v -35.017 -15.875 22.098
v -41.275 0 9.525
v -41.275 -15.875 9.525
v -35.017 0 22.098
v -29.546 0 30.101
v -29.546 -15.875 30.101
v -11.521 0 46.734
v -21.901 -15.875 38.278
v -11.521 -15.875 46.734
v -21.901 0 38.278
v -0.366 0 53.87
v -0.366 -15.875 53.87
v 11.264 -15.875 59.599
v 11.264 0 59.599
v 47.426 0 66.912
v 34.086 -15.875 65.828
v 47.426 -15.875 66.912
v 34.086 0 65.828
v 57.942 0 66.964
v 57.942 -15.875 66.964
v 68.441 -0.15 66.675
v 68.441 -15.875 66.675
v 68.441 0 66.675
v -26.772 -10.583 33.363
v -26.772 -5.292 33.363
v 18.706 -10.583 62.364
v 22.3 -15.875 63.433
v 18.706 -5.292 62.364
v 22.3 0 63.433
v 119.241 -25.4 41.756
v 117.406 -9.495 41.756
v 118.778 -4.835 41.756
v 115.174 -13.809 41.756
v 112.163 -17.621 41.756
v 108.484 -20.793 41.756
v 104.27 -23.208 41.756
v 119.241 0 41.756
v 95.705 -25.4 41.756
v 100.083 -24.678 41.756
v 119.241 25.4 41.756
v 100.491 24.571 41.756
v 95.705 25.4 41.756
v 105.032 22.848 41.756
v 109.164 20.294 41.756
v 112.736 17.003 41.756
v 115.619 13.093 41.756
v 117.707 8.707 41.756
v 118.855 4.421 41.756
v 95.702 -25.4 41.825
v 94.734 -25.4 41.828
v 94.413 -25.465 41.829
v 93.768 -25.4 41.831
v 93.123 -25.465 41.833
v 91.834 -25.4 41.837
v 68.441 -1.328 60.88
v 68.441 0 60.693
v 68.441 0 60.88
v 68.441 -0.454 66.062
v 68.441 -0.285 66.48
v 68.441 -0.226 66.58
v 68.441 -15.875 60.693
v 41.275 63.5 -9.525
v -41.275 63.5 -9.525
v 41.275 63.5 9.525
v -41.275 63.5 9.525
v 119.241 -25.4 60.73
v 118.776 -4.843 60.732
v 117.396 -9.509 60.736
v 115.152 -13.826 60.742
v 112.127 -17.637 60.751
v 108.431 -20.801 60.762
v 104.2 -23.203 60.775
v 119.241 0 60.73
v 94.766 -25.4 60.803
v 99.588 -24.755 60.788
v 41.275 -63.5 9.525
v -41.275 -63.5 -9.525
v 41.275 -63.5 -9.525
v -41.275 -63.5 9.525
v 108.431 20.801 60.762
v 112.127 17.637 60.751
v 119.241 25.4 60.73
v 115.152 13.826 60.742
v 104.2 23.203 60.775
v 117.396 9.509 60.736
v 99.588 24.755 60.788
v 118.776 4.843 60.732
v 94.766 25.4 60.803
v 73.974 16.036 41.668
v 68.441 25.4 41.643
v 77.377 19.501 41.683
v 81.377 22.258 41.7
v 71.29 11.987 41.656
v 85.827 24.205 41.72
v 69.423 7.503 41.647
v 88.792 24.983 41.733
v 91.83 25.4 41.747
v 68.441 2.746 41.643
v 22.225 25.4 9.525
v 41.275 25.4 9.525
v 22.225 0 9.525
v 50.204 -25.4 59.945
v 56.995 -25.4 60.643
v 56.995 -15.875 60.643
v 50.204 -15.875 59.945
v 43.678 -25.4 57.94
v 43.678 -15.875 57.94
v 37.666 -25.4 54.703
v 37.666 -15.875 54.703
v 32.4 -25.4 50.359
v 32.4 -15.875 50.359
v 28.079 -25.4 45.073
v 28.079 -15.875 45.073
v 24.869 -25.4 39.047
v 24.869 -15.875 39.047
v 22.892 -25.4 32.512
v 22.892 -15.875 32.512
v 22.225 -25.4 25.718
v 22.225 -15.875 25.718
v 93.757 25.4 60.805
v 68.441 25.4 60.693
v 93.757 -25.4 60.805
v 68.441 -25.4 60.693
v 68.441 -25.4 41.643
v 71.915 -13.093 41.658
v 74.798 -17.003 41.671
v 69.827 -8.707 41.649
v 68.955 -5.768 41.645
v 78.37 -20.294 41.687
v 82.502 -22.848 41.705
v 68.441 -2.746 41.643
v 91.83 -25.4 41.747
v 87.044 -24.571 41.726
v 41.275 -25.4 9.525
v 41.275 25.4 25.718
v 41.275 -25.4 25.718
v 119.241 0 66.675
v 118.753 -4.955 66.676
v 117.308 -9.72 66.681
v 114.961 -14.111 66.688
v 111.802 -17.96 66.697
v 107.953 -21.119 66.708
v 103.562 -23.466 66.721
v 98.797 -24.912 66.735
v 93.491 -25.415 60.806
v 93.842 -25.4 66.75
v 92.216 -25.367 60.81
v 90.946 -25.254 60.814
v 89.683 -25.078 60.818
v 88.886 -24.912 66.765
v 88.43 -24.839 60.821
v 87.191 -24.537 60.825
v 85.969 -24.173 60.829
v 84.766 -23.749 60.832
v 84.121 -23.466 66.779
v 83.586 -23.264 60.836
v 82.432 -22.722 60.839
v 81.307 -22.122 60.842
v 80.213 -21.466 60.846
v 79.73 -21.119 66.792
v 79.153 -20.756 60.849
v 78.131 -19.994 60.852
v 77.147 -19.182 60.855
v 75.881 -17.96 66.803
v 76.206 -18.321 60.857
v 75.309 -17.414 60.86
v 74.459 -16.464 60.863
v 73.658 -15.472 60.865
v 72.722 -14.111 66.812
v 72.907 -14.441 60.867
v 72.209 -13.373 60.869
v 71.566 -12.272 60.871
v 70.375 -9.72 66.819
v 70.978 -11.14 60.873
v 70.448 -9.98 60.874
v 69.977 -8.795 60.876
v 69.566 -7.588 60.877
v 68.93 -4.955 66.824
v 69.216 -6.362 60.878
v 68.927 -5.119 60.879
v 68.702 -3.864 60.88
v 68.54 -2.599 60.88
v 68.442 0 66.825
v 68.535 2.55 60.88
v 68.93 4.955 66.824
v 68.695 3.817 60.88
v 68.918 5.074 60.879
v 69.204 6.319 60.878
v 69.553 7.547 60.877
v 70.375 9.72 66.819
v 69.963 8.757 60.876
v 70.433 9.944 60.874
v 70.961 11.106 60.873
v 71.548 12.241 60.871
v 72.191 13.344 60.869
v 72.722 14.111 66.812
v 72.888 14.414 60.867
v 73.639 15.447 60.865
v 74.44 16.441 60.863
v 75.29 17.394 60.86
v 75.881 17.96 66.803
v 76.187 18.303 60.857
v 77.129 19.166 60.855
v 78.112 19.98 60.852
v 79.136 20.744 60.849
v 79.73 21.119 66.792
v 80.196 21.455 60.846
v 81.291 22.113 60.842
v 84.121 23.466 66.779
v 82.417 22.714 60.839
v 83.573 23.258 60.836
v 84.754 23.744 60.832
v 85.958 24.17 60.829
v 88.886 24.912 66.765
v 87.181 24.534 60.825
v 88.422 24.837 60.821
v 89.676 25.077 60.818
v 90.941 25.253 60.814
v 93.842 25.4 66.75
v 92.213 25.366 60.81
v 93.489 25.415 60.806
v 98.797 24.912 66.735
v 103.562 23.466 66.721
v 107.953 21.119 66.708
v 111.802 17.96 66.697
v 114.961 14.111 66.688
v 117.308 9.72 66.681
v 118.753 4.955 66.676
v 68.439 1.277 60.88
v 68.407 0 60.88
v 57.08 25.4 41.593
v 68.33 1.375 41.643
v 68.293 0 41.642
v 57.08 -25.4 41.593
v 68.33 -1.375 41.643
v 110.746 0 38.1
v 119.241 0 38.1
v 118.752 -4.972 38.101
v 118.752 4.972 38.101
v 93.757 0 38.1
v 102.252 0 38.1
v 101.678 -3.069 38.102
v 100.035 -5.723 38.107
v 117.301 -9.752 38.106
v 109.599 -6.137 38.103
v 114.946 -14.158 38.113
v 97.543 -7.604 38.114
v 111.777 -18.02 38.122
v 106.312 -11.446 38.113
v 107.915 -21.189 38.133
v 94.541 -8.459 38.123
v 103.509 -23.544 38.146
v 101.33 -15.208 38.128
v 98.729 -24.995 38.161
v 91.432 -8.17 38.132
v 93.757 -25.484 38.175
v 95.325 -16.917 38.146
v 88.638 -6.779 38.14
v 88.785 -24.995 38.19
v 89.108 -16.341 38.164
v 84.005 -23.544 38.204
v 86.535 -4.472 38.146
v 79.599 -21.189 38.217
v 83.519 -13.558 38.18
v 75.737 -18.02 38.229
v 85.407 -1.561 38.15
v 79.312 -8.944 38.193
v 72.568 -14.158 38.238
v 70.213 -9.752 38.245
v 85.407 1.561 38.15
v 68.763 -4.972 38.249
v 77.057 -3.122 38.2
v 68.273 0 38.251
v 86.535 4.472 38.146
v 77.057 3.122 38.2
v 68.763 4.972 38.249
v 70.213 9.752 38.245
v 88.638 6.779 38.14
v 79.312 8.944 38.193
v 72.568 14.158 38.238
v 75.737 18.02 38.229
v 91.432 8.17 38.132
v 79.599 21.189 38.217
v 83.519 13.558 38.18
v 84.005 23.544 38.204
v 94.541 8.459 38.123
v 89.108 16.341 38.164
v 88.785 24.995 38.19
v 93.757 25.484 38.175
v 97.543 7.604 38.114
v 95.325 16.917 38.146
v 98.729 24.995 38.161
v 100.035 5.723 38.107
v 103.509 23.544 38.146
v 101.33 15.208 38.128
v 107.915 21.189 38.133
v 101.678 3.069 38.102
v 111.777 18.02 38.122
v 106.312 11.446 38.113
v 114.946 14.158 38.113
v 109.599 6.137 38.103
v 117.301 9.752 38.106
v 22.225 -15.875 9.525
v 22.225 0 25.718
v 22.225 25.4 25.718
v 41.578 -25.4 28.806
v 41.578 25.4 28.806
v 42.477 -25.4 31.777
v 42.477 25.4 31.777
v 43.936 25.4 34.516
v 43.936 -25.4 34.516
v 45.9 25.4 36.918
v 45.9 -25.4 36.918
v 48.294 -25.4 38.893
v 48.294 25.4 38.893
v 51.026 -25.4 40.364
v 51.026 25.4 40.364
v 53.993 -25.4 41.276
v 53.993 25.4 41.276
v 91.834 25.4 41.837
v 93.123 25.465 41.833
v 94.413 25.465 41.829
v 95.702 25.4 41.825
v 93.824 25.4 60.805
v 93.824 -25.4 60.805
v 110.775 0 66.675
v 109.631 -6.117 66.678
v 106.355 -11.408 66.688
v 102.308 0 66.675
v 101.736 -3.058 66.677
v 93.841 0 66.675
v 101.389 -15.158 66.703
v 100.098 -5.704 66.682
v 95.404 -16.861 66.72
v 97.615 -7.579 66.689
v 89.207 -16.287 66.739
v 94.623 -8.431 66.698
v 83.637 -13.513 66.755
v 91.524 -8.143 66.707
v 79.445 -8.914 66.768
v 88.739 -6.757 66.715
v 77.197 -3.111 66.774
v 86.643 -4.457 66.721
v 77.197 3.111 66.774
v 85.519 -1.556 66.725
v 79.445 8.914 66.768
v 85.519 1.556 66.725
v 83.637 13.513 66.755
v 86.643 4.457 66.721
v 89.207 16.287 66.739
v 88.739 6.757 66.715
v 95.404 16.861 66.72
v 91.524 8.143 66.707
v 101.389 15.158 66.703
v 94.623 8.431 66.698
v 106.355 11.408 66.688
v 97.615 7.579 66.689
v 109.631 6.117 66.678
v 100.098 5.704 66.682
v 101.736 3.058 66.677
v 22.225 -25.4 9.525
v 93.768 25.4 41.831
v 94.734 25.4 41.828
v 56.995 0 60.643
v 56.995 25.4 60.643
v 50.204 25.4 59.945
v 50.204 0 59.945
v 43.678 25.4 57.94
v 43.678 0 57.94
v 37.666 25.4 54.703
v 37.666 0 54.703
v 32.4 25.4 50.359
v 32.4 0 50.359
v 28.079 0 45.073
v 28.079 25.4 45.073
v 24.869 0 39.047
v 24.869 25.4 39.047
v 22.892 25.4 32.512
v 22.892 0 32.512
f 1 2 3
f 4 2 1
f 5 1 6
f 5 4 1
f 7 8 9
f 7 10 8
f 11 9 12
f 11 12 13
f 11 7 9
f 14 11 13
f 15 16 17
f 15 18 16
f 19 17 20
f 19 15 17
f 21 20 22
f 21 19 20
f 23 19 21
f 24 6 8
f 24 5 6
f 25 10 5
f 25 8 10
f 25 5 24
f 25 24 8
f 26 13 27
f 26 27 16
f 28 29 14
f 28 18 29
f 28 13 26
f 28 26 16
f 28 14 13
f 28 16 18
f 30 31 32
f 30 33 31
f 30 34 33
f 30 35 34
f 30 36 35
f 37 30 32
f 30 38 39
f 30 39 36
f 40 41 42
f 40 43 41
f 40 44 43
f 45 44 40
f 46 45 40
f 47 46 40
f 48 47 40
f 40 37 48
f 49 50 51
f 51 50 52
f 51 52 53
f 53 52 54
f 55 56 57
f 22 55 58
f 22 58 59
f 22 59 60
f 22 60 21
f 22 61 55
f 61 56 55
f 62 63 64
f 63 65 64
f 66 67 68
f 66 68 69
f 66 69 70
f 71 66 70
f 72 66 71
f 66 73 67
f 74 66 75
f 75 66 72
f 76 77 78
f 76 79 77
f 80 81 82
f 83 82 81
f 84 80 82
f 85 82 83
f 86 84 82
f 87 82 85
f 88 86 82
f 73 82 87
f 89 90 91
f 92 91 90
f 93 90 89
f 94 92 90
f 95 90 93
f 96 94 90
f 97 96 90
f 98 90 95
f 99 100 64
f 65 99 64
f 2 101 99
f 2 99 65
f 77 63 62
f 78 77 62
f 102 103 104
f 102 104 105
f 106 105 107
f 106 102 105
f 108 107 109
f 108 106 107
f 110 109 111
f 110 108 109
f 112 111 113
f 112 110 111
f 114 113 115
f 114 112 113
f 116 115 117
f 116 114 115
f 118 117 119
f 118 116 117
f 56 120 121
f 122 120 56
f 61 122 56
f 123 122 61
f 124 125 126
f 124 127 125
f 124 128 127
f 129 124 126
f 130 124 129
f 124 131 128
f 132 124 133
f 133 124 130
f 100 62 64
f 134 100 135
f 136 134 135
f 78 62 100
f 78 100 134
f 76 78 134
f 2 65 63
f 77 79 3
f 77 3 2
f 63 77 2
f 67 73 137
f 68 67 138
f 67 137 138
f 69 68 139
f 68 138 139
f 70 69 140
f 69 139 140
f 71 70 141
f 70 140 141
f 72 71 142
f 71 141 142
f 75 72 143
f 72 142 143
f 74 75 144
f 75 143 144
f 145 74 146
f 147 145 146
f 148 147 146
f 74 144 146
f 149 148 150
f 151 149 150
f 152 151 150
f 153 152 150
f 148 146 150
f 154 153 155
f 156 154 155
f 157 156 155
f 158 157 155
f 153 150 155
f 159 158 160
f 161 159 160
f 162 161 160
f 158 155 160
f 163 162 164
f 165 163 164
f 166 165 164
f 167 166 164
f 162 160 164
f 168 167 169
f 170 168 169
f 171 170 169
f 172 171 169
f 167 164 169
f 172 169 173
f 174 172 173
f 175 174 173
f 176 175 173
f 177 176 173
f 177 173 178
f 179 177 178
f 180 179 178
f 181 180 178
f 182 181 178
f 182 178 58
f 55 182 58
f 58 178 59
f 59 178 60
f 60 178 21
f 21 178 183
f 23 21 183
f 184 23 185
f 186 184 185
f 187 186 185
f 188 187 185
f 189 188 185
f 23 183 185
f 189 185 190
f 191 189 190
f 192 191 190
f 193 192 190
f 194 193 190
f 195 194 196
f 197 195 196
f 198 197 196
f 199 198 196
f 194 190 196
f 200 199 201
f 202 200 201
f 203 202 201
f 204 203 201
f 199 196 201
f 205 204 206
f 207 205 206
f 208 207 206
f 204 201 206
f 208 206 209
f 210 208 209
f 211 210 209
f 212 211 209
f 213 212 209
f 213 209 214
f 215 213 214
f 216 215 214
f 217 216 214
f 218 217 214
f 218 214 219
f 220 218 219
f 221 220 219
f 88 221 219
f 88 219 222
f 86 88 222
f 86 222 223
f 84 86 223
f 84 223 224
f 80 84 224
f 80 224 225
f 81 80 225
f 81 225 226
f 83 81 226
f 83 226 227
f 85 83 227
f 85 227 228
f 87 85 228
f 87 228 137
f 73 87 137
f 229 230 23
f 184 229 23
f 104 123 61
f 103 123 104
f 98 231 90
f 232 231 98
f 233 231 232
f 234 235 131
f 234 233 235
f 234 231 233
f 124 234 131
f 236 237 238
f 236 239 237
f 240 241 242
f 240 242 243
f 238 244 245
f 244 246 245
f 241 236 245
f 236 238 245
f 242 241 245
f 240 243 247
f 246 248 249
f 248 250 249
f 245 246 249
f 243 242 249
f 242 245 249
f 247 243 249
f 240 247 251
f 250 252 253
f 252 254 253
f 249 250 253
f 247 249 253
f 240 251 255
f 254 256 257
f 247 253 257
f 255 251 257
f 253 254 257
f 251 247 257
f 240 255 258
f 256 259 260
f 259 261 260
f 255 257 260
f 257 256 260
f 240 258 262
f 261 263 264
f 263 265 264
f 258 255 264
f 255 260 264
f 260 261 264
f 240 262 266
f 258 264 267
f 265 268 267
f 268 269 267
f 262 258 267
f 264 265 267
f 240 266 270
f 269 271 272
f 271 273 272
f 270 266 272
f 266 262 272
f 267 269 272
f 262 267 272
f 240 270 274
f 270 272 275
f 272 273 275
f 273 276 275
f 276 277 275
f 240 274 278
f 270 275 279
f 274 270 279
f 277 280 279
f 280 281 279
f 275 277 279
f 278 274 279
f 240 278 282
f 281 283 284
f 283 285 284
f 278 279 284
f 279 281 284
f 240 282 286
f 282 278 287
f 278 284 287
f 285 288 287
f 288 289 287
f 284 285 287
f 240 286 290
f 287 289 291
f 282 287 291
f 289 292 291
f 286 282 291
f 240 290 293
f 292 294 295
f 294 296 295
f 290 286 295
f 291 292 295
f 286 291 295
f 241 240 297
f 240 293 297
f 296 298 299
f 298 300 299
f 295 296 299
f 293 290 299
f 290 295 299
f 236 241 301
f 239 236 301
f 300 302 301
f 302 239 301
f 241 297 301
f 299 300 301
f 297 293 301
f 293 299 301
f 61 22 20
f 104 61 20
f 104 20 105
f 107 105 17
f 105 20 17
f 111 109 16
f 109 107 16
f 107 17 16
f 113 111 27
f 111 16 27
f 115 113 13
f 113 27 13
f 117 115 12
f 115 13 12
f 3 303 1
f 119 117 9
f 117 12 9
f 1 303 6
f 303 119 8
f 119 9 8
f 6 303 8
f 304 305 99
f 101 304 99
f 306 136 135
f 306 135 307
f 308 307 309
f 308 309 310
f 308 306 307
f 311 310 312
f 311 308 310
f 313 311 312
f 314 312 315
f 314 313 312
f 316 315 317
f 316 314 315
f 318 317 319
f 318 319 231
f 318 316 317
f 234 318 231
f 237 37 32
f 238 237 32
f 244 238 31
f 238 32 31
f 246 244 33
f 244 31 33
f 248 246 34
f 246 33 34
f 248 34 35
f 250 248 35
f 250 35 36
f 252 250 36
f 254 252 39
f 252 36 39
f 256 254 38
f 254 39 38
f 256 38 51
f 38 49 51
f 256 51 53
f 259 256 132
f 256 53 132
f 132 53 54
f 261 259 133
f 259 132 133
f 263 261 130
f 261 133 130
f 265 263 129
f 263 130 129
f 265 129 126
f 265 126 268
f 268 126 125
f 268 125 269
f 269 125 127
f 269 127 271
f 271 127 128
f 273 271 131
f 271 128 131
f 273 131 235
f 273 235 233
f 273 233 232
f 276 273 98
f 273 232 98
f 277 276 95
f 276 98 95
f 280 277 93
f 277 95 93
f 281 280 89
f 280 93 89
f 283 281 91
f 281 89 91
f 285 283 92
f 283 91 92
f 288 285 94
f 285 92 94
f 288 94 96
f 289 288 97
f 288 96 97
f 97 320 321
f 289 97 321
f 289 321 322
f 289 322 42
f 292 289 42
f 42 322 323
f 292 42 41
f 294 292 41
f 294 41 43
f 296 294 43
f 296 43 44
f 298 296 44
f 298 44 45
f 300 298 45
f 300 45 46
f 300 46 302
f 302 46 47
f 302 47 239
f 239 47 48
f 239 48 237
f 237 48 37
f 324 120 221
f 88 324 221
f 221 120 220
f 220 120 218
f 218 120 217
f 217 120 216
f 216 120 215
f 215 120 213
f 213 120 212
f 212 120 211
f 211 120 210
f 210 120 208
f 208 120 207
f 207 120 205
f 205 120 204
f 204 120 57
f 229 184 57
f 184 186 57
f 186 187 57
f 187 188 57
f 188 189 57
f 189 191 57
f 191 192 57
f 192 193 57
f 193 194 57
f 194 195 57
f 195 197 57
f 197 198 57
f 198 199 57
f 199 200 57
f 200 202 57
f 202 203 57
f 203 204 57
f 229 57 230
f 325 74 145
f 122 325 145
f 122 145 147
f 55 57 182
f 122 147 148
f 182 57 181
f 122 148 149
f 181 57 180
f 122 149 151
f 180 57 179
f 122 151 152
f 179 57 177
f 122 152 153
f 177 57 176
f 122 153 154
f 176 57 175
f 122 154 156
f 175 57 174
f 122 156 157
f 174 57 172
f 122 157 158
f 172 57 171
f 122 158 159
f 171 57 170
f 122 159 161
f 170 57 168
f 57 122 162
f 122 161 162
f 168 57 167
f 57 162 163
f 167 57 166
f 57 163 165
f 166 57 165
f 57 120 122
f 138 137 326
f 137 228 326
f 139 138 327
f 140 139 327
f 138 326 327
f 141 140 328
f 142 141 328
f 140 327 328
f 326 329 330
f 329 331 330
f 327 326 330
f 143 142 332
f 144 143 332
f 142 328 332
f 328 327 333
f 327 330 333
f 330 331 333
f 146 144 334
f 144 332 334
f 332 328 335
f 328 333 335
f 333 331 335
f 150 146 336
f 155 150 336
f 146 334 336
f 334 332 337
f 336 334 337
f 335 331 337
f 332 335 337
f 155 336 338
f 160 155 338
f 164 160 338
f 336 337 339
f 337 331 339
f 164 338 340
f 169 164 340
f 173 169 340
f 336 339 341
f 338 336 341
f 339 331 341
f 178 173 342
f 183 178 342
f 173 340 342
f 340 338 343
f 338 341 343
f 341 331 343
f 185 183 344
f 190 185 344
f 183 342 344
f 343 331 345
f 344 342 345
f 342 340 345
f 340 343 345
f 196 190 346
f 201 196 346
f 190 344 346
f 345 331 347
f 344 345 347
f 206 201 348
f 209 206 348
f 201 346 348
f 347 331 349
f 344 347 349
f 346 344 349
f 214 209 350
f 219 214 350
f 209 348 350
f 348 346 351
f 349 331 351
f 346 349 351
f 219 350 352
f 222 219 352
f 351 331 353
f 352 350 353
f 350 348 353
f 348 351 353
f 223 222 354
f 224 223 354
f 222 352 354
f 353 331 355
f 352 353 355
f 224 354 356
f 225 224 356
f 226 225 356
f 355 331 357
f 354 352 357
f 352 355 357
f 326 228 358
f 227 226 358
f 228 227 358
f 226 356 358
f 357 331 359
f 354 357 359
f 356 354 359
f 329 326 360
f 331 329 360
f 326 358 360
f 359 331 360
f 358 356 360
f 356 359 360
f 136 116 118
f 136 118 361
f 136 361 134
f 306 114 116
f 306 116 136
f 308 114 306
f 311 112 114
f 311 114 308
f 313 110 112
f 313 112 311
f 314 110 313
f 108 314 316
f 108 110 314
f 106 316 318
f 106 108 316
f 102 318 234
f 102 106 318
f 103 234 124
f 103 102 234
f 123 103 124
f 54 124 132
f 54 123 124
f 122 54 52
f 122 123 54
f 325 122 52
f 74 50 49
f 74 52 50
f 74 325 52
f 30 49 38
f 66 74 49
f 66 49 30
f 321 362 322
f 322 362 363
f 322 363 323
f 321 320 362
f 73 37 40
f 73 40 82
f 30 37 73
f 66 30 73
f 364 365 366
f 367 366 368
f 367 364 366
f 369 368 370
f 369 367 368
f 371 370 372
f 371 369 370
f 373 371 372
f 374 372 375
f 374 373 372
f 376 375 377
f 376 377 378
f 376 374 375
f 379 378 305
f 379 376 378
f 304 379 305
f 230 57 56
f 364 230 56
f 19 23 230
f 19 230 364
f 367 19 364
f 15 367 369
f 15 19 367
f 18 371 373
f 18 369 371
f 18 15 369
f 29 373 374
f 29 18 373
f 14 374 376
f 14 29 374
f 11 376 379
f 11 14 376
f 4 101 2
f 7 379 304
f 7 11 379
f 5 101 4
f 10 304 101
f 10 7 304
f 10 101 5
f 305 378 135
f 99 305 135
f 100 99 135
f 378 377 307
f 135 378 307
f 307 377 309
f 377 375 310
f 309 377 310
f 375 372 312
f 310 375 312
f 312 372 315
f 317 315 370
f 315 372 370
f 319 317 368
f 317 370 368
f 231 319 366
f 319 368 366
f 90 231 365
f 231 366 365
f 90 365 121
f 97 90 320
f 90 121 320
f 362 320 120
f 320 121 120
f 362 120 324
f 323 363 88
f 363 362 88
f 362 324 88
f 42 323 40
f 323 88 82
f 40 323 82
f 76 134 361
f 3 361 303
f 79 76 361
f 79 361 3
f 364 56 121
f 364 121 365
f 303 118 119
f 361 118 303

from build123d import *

# Parameters (mm, degrees)
F1_DEPTH = 63.5
F2_DEPTH = 25.4
F3_DEPTH = 15.875
F4_DEPTH = 25.4


with BuildPart() as f1:
    # F0 (on Front) → F1 (new body, symmetric)
    with BuildSketch(Plane.XZ):
        Polygon((-41.275, -9.525), (41.275, -9.525), (41.275, 9.525), (22.225, 9.525), (-41.275, 9.525), align=None)
    extrude(amount=F1_DEPTH, both=True)

    # F0 (on Front) → F2 (join, symmetric)
    with BuildSketch(Plane.XZ):
        with BuildLine():
            Line((22.225, 9.525), (41.275, 9.525))
            Line((41.275, 9.525), (41.275, 25.7178696878))
            ThreePointArc((41.275, 25.7178696878), (45.8998261561, 36.9182809964), (57.0796253206, 41.5927136998))
            Line((57.0796253206, 41.5927136998), (68.4412825856, 41.643080997))
            Line((68.4412825856, 41.643080997), (68.4412825856, 60.6932681845))
            Line((68.4412825856, 60.6932681845), (56.9951757054, 60.6425265141))
            ThreePointArc((56.9951757054, 60.6425265141), (32.3996175435, 50.3587745668), (22.225, 25.7178696878))
            Line((22.225, 25.7178696878), (22.225, 9.525))
        make_face()
    extrude(amount=F2_DEPTH, both=True)

    # F0 (on Front) → F3 (join)
    with BuildSketch(Plane.XZ):
        with BuildLine():
            add(Edge.make_bspline(
                [(-41.275, 9.525), (-37.726026519, 17.3571106564), (-29.2428259937, 36.0784016411), (18.3467226323, 68.3243904358), (51.9597658065, 67.2176628394), (68.4412825856, 66.675)],
                knots=[0, 0, 0, 0, 0.2682476731, 0.6411991562, 1, 1, 1, 1], degree=3))
            Line((-41.275, 9.525), (22.225, 9.525))
            Line((22.225, 9.525), (22.225, 25.7178696878))
            ThreePointArc((22.225, 25.7178696878), (32.3996175435, 50.3587745668), (56.9951757054, 60.6425265141))
            Line((56.9951757054, 60.6425265141), (68.4412825856, 60.6932681845))
            Line((68.4412825856, 60.6932681845), (68.4412825856, 66.675))
        make_face()
    extrude(amount=F3_DEPTH)

    # F0 (on Front) → F4 (join, symmetric)
    with BuildSketch(Plane.XZ):
        Polygon((93.7568329704, 60.8054944048), (68.4412825856, 60.6932681845), (68.4412825856, 41.643080997), (93.7676358867, 41.7553551076), (93.8239354557, 60.8052960923), align=None)
        Polygon((119.2412825856, 60.7301785005), (93.8239354557, 60.8052960923), (93.7676358867, 41.7553551076), (93.8412825856, 41.7556815904), (119.2412825856, 41.7556815904), align=None)
    extrude(amount=F4_DEPTH, both=True)

    # F0 (on Front) → F5 (revolve)
    with BuildSketch(Plane.XZ):
        Polygon((93.8412825856, 41.7556815904), (93.7676358867, 41.7553551076), (93.7568329704, 38.1), (119.2412825856, 38.1), (119.2412825856, 41.7556815904), align=None)
        Polygon((119.2412825856, 66.675), (93.8412825856, 66.675), (93.8239354557, 60.8052960923), (119.2412825856, 60.7301785005), align=None)
    revolve(axis=Axis((93.799057778, 0, 52.3875), (-0.0029553542, 0, -0.9999956329)))


solid = f1.part
